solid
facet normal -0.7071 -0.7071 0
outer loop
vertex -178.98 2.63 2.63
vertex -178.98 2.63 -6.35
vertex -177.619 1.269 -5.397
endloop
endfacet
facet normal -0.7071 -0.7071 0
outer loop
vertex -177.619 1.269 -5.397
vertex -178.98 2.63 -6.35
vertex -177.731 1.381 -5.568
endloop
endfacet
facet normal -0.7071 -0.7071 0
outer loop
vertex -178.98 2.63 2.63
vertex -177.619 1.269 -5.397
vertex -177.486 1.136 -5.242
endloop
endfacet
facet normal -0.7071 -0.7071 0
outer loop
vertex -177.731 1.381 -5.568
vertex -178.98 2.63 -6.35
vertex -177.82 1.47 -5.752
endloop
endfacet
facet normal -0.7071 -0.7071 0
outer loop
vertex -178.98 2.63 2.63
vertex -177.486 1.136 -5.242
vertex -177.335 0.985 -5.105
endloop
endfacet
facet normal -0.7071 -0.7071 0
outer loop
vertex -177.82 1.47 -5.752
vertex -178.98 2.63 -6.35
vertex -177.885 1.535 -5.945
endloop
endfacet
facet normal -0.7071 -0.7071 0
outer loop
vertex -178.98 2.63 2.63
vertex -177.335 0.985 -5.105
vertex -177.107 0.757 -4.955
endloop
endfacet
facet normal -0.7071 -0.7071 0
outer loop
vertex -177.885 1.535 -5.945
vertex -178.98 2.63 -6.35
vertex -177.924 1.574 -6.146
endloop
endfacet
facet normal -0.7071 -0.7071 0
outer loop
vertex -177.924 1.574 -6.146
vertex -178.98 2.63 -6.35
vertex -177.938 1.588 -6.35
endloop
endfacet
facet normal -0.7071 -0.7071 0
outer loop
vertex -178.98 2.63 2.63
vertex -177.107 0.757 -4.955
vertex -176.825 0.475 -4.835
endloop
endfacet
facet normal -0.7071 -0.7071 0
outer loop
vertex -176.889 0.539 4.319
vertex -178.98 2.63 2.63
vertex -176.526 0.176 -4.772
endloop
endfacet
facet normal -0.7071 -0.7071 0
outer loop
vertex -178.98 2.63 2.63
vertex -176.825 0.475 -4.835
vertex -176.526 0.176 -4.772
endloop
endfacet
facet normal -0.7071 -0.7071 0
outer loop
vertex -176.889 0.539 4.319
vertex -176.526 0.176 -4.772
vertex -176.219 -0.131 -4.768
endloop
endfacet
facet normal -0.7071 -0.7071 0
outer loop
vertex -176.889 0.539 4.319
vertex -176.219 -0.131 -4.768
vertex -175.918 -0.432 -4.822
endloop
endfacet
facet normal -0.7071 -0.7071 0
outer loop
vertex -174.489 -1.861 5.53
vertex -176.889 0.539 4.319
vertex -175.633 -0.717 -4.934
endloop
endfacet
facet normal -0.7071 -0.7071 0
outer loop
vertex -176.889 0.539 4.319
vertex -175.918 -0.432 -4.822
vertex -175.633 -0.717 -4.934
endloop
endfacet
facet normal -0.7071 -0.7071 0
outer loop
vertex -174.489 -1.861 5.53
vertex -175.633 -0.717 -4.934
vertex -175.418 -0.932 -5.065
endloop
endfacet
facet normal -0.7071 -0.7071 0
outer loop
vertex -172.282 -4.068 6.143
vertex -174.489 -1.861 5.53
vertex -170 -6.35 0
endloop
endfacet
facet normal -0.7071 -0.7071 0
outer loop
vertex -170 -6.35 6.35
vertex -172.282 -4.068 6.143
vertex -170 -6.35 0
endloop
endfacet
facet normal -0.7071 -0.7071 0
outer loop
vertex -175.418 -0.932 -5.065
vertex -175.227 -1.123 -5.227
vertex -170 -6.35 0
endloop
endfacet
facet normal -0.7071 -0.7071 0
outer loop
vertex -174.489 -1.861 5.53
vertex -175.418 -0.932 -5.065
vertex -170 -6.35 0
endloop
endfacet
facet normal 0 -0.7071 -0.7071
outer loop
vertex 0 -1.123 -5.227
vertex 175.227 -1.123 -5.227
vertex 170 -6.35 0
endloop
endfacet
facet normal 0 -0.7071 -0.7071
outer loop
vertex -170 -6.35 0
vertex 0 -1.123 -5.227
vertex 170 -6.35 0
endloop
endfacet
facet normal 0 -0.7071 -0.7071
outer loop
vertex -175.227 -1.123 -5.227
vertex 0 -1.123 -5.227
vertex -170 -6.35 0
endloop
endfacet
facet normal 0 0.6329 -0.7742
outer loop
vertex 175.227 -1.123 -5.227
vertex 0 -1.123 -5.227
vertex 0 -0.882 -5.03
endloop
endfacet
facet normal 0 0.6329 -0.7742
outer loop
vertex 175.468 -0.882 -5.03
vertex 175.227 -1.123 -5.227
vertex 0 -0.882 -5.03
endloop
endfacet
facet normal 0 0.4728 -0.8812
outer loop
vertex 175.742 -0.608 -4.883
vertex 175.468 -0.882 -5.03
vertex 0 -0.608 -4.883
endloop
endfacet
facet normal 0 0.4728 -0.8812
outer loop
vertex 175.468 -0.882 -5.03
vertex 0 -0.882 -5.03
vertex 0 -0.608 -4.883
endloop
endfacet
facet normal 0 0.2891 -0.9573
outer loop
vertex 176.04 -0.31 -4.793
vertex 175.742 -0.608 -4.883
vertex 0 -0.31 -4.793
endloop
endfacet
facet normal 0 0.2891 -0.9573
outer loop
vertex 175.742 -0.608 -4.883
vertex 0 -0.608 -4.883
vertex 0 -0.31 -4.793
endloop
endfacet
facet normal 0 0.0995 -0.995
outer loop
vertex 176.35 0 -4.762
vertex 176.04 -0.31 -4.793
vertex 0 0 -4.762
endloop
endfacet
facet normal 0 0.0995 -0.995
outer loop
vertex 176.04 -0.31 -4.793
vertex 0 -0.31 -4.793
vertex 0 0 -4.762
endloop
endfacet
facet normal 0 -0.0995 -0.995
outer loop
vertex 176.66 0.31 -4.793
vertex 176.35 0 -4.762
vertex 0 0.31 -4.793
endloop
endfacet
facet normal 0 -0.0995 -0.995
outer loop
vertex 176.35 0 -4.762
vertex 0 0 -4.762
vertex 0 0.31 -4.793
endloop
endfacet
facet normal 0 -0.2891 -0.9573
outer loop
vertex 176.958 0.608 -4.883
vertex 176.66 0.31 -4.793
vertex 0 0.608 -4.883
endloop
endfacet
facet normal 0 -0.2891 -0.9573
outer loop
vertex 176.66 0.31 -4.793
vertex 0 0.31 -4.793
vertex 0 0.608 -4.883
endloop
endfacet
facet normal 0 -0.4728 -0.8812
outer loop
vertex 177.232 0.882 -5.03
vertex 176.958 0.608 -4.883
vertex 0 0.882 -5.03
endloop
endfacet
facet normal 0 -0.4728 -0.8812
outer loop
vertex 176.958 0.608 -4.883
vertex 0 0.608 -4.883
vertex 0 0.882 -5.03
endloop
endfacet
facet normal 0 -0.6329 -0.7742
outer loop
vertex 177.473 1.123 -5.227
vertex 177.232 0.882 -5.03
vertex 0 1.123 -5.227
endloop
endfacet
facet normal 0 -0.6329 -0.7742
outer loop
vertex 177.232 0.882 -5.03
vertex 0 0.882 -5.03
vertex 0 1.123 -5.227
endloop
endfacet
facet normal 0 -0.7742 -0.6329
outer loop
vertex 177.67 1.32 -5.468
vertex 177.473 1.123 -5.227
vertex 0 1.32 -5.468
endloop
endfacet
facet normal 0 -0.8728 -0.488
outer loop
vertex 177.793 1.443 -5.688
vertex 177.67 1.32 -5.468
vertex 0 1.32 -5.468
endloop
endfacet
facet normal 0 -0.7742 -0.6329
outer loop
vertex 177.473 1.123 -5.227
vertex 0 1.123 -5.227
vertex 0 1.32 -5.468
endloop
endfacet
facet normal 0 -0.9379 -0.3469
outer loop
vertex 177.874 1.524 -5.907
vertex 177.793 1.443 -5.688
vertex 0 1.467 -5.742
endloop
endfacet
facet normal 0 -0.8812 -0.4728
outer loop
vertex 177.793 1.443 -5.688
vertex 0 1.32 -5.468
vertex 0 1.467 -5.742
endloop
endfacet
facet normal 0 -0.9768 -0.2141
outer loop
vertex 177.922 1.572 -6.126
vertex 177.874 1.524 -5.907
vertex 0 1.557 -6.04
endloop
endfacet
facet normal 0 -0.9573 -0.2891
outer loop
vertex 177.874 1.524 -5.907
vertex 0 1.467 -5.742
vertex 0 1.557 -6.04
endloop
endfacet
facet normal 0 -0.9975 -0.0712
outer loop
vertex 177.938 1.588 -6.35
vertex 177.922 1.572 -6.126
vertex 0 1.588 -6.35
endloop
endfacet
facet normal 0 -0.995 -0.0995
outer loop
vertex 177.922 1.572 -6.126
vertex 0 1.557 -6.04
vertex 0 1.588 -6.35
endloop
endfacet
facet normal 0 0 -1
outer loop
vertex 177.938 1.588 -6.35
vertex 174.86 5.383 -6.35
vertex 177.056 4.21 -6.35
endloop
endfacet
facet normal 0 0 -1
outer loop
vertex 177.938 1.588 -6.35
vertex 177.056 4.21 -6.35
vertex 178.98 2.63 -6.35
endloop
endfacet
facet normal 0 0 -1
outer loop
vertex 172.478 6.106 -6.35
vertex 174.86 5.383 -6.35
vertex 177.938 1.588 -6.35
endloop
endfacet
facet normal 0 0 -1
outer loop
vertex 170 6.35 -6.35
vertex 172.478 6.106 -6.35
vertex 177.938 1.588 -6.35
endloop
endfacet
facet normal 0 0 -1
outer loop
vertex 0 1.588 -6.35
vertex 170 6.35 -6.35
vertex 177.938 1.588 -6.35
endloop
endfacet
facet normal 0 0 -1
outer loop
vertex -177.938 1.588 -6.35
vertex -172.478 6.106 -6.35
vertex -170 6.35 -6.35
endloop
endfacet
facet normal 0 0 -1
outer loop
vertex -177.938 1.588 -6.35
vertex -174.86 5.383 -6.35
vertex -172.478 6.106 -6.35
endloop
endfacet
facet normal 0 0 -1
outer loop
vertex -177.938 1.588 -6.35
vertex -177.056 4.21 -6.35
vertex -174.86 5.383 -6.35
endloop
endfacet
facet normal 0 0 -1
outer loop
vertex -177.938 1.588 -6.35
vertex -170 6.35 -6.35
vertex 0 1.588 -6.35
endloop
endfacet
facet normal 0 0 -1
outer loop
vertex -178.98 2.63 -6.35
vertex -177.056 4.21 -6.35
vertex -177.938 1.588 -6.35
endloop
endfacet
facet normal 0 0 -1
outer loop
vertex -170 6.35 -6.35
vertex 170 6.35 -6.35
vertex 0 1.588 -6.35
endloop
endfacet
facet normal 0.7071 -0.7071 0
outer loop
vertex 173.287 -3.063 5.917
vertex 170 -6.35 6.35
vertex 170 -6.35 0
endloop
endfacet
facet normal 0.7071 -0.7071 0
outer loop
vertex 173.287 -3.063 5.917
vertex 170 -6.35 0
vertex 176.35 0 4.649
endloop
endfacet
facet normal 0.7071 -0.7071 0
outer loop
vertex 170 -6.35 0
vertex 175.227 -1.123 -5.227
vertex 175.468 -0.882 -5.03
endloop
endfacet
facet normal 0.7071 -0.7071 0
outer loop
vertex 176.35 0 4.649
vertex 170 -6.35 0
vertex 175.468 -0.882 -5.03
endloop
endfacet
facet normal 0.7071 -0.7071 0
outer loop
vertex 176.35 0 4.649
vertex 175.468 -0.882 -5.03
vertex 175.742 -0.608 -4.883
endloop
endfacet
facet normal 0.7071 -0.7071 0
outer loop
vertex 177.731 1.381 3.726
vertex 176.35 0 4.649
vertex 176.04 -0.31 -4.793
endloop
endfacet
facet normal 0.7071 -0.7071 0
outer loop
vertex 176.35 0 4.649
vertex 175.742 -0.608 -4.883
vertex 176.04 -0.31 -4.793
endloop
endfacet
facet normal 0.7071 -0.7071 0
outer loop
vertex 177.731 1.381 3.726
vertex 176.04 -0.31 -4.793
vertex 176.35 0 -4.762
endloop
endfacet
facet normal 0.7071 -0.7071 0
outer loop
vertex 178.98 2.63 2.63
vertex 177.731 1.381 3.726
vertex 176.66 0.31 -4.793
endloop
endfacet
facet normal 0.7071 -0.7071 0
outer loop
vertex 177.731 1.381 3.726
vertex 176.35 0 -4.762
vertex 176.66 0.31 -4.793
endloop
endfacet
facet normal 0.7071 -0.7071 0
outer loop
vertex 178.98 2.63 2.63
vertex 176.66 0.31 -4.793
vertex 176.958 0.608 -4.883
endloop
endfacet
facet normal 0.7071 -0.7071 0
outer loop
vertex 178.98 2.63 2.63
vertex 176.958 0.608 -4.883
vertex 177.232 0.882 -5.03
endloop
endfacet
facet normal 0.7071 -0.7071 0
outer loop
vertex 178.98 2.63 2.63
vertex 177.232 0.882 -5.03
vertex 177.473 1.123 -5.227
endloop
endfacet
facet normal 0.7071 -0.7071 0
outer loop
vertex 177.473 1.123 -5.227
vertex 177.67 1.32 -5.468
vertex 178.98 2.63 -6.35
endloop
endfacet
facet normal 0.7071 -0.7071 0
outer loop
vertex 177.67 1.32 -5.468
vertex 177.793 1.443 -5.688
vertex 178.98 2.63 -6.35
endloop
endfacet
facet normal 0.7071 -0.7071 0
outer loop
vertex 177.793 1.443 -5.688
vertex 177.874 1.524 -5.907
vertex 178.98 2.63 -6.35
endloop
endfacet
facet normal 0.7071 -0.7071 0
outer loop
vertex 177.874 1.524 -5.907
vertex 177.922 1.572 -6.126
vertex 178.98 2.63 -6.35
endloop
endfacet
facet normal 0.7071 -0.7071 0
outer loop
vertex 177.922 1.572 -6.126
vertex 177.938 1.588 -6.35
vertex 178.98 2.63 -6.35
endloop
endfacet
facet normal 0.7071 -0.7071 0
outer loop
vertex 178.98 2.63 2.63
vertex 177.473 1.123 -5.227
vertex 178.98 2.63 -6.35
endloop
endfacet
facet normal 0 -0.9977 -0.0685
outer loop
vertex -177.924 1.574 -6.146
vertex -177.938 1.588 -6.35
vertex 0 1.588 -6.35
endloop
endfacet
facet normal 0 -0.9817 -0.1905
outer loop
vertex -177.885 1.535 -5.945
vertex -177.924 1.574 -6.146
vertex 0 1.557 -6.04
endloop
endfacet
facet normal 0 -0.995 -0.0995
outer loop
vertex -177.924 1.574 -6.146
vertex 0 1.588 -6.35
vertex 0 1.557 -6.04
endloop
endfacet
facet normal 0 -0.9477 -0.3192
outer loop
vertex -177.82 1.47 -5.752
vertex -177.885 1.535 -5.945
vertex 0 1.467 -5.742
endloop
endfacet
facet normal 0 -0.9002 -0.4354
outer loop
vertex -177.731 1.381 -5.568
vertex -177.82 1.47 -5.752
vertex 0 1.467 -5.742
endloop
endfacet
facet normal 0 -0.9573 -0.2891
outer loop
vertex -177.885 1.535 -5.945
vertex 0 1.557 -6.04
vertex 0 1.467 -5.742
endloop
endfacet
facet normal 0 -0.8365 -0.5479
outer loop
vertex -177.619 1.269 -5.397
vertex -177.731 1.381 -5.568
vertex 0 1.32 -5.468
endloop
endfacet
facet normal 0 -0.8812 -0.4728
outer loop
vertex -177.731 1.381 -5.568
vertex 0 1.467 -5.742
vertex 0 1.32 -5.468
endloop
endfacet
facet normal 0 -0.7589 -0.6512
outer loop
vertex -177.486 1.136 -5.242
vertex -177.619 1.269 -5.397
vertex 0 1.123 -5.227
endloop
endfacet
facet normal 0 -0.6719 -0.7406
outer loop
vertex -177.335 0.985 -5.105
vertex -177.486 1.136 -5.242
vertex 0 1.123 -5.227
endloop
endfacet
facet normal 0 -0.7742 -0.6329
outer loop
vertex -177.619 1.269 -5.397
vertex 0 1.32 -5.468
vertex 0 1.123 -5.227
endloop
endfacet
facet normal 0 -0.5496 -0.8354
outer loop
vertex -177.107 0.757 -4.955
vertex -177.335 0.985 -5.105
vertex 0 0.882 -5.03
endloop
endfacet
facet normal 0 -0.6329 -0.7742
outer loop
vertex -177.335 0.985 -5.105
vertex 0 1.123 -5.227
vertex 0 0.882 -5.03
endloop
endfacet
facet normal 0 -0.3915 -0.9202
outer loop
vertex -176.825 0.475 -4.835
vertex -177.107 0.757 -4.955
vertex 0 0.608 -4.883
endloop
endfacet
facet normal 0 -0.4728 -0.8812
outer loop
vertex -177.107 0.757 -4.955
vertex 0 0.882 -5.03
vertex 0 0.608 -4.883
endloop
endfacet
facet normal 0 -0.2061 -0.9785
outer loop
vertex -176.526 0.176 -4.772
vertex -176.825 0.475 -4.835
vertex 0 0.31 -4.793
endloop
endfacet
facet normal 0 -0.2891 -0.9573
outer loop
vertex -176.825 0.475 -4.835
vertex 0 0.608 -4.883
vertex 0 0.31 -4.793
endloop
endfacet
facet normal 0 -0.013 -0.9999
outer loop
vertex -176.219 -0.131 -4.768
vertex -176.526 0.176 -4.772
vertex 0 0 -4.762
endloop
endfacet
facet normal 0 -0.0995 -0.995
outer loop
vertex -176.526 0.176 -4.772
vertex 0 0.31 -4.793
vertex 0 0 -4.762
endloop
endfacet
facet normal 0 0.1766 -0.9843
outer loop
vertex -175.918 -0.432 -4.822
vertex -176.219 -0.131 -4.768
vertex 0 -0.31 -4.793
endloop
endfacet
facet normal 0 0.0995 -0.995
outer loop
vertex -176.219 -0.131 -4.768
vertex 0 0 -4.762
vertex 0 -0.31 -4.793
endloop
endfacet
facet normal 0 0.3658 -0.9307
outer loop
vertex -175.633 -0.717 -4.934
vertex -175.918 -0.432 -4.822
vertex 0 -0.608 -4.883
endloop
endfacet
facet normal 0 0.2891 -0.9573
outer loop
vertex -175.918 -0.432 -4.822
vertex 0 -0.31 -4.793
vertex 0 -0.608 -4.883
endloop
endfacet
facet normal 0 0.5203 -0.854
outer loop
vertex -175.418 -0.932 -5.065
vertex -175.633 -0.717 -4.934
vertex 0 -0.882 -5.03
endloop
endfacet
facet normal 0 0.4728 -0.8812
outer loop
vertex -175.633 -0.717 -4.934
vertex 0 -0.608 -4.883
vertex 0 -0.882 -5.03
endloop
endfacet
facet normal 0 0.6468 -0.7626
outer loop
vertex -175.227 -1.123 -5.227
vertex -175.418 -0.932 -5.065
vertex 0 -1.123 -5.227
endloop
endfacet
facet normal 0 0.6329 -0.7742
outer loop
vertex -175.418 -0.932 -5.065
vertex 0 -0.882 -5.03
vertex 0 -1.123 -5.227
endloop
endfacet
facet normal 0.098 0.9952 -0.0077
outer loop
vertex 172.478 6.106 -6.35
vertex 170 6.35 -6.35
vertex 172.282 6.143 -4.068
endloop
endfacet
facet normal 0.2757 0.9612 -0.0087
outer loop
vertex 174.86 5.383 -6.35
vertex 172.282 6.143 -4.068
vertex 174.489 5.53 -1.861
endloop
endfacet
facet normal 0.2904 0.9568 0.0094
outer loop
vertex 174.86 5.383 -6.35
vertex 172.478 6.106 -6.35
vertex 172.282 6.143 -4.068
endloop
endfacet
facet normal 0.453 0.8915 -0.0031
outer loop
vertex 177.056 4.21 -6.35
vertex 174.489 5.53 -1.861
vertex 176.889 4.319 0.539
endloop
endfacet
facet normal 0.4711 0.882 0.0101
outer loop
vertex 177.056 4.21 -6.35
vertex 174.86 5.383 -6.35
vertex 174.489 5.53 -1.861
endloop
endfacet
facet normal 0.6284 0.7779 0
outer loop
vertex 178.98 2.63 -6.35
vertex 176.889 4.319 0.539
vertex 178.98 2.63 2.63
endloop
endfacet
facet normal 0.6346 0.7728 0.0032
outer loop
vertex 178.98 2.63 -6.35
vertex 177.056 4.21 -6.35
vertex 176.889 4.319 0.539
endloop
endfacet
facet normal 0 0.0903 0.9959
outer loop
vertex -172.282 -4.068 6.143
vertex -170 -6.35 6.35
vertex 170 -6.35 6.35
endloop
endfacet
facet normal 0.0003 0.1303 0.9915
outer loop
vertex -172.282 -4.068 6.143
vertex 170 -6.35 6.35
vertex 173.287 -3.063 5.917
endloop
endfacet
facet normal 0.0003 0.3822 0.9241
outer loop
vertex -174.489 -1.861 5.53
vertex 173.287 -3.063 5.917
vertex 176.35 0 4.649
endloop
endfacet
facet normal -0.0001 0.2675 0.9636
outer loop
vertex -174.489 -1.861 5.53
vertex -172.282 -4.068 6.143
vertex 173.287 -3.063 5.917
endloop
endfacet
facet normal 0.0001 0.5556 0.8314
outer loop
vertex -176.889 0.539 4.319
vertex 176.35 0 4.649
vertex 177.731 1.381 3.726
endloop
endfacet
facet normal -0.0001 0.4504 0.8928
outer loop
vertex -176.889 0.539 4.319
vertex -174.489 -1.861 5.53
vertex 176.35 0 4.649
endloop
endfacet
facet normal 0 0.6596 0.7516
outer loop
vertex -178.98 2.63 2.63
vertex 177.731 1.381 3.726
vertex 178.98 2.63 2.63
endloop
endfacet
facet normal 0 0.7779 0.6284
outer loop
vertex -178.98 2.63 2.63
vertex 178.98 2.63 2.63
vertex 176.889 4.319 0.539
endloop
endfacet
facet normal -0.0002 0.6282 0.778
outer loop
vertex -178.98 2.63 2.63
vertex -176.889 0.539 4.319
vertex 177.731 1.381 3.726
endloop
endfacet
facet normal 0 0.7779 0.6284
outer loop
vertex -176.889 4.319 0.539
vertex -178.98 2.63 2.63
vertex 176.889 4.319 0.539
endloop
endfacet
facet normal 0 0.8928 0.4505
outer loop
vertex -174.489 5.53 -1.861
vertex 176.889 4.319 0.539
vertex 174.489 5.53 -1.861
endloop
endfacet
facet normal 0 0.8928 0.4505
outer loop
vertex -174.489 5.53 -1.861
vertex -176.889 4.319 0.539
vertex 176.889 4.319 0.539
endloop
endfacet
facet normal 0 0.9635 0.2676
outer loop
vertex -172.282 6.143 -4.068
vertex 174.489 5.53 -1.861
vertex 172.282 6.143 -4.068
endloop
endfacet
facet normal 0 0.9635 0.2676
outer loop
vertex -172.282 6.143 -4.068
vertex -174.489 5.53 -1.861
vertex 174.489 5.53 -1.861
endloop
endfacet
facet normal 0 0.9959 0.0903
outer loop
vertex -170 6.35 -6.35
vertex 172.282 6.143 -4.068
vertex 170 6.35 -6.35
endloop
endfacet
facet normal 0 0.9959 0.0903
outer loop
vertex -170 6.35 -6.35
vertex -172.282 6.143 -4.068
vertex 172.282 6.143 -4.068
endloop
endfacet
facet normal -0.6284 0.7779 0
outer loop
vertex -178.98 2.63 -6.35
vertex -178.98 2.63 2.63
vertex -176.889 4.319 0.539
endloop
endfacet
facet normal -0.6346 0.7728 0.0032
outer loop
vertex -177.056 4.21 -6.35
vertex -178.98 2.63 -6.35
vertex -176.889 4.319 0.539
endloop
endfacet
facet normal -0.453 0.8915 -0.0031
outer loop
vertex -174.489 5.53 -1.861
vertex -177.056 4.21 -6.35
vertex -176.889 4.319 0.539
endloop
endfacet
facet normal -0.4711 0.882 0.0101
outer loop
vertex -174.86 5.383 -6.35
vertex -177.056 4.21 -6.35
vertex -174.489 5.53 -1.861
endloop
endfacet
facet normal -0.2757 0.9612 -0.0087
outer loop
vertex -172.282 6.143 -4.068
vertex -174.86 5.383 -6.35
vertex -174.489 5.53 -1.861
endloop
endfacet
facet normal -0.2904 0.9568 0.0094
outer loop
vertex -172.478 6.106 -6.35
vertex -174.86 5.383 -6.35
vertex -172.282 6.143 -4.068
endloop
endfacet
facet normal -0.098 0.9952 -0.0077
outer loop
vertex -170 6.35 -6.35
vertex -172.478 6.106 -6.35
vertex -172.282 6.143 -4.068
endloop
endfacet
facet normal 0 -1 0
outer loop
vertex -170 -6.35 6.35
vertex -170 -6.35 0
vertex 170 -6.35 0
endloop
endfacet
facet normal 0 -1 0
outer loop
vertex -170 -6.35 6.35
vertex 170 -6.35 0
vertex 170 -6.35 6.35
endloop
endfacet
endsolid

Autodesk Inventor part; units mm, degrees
ref_plane "YZ Plane" through (0, 0, 0) normal (1, 0, 0) x (0, 1, 0)
ref_plane "XZ Plane" through (0, 0, 0) normal (0, 1, 0) x (-1, 0, 0)
ref_plane "XY Plane" through (0, 0, 0) normal (0, 0, 1) x (1, 0, 0)
sketch "Sketch1" plane through (0, 0, 0) normal (1, 0, 0) x (0, 1, 0)
  line L0 (-6.35, 6.35) -> (6.35, 6.35)
  line L1 (6.35, 6.35) -> (6.35, -6.35)
  line L2 (6.35, -6.35) -> (-6.35, -6.35)
  line L3 (-6.35, -6.35) -> (-6.35, 6.35)
  line L4 (-6.35, 6.35) -> (6.35, -6.35) construction
  line L5 (6.35, 6.35) -> (-6.35, -6.35) construction
  point P0 (0, 0)
  dimension "d0" = 12.7
  dimension "d1" = 12.7
extrude "Extrusion1" add sketch "Sketch1" along normal mid plane 365.4
fillet "Fillet1" radius 12.7 3 edges at (0, 6.35, 6.35) (-182.7, 6.35, 0) (182.7, 6.35, 0)
chamfer "Chamfer1" distance 6.35 angle 45 1 edges at (0, -6.35, -6.35)
sketch "Sketch2" plane through (0, 0, 0) normal (0, 0, 1) x (1, 0, 0)
  line L0 (-182.7, -6.35) -> (182.7, -6.35) projected
  line L1 (170, 6.35) -> (-170, 6.35) projected
  line L2 (-182.7, -6.35) -> (-182.7, 6.35)
  line L3 (-182.7, 6.35) -> (-170, -6.35)
  line L4 (-182.7, 6.35) -> (-170, 6.35) construction
  point P0 (0, 0)
  dimension "d11" = 45
extrude "Extrusion2" cut sketch "Sketch2" along normal through all both and the other way through all
mirror "Mirror1" about plane through (0, 0, 0) normal (1, 0, 0) of "Extrusion2"
sketch "Sketch3" plane through (0, 0, 0) normal (1, 0, 0) x (0, 1, 0)
  line L0 (-6.35, 6.35) -> (-6.35, 6.35) projected
  line L1 (-6.35, 0) -> (-6.35, 6.35) projected
  line L2 (0, -6.35) -> (-6.35, 0) projected
  line L3 (2.6303, -6.35) -> (0, -6.35) projected
  line L4 (2.6303, 2.6303) -> (2.6303, -6.35) projected
  arc A0 (2.6303, 2.6303) -> (-6.35, 6.35) centre (-6.35, -6.35) ccw projected
  circle A1 centre (0, -6.35) radius 1.5875
  line L5 (6.35, -6.35) -> (2.6303, -6.35) projected
  point P0 (0, 0)
  dimension "d14" = 3.175
  dimension "d15" = 6.35
extrude "Extrusion3" cut sketch "Sketch3" along normal through all both and the other way through all contours A1 L3 L2 | L2 L3 A1
equation "\"d0\" = facingThickness"
equation "\"d1\" = facingThickness"
equation "\"d7\" = 0.999999 * facingThickness"
equation "\"d4\" = 0.5 * facingThickness"
equation "\"d14\" = 0.25 * facingThickness"
equation "\"d15\" = 0.5 * facingThickness"
equation "\"mppcMountThickness\" = 6.35"
equation "\"facingThickness\" = 12.7"
equation "\"facingGasketThickness\" = 1.5875"
properties part number "frontBackMoulding" material "Wood (Cherry)"
